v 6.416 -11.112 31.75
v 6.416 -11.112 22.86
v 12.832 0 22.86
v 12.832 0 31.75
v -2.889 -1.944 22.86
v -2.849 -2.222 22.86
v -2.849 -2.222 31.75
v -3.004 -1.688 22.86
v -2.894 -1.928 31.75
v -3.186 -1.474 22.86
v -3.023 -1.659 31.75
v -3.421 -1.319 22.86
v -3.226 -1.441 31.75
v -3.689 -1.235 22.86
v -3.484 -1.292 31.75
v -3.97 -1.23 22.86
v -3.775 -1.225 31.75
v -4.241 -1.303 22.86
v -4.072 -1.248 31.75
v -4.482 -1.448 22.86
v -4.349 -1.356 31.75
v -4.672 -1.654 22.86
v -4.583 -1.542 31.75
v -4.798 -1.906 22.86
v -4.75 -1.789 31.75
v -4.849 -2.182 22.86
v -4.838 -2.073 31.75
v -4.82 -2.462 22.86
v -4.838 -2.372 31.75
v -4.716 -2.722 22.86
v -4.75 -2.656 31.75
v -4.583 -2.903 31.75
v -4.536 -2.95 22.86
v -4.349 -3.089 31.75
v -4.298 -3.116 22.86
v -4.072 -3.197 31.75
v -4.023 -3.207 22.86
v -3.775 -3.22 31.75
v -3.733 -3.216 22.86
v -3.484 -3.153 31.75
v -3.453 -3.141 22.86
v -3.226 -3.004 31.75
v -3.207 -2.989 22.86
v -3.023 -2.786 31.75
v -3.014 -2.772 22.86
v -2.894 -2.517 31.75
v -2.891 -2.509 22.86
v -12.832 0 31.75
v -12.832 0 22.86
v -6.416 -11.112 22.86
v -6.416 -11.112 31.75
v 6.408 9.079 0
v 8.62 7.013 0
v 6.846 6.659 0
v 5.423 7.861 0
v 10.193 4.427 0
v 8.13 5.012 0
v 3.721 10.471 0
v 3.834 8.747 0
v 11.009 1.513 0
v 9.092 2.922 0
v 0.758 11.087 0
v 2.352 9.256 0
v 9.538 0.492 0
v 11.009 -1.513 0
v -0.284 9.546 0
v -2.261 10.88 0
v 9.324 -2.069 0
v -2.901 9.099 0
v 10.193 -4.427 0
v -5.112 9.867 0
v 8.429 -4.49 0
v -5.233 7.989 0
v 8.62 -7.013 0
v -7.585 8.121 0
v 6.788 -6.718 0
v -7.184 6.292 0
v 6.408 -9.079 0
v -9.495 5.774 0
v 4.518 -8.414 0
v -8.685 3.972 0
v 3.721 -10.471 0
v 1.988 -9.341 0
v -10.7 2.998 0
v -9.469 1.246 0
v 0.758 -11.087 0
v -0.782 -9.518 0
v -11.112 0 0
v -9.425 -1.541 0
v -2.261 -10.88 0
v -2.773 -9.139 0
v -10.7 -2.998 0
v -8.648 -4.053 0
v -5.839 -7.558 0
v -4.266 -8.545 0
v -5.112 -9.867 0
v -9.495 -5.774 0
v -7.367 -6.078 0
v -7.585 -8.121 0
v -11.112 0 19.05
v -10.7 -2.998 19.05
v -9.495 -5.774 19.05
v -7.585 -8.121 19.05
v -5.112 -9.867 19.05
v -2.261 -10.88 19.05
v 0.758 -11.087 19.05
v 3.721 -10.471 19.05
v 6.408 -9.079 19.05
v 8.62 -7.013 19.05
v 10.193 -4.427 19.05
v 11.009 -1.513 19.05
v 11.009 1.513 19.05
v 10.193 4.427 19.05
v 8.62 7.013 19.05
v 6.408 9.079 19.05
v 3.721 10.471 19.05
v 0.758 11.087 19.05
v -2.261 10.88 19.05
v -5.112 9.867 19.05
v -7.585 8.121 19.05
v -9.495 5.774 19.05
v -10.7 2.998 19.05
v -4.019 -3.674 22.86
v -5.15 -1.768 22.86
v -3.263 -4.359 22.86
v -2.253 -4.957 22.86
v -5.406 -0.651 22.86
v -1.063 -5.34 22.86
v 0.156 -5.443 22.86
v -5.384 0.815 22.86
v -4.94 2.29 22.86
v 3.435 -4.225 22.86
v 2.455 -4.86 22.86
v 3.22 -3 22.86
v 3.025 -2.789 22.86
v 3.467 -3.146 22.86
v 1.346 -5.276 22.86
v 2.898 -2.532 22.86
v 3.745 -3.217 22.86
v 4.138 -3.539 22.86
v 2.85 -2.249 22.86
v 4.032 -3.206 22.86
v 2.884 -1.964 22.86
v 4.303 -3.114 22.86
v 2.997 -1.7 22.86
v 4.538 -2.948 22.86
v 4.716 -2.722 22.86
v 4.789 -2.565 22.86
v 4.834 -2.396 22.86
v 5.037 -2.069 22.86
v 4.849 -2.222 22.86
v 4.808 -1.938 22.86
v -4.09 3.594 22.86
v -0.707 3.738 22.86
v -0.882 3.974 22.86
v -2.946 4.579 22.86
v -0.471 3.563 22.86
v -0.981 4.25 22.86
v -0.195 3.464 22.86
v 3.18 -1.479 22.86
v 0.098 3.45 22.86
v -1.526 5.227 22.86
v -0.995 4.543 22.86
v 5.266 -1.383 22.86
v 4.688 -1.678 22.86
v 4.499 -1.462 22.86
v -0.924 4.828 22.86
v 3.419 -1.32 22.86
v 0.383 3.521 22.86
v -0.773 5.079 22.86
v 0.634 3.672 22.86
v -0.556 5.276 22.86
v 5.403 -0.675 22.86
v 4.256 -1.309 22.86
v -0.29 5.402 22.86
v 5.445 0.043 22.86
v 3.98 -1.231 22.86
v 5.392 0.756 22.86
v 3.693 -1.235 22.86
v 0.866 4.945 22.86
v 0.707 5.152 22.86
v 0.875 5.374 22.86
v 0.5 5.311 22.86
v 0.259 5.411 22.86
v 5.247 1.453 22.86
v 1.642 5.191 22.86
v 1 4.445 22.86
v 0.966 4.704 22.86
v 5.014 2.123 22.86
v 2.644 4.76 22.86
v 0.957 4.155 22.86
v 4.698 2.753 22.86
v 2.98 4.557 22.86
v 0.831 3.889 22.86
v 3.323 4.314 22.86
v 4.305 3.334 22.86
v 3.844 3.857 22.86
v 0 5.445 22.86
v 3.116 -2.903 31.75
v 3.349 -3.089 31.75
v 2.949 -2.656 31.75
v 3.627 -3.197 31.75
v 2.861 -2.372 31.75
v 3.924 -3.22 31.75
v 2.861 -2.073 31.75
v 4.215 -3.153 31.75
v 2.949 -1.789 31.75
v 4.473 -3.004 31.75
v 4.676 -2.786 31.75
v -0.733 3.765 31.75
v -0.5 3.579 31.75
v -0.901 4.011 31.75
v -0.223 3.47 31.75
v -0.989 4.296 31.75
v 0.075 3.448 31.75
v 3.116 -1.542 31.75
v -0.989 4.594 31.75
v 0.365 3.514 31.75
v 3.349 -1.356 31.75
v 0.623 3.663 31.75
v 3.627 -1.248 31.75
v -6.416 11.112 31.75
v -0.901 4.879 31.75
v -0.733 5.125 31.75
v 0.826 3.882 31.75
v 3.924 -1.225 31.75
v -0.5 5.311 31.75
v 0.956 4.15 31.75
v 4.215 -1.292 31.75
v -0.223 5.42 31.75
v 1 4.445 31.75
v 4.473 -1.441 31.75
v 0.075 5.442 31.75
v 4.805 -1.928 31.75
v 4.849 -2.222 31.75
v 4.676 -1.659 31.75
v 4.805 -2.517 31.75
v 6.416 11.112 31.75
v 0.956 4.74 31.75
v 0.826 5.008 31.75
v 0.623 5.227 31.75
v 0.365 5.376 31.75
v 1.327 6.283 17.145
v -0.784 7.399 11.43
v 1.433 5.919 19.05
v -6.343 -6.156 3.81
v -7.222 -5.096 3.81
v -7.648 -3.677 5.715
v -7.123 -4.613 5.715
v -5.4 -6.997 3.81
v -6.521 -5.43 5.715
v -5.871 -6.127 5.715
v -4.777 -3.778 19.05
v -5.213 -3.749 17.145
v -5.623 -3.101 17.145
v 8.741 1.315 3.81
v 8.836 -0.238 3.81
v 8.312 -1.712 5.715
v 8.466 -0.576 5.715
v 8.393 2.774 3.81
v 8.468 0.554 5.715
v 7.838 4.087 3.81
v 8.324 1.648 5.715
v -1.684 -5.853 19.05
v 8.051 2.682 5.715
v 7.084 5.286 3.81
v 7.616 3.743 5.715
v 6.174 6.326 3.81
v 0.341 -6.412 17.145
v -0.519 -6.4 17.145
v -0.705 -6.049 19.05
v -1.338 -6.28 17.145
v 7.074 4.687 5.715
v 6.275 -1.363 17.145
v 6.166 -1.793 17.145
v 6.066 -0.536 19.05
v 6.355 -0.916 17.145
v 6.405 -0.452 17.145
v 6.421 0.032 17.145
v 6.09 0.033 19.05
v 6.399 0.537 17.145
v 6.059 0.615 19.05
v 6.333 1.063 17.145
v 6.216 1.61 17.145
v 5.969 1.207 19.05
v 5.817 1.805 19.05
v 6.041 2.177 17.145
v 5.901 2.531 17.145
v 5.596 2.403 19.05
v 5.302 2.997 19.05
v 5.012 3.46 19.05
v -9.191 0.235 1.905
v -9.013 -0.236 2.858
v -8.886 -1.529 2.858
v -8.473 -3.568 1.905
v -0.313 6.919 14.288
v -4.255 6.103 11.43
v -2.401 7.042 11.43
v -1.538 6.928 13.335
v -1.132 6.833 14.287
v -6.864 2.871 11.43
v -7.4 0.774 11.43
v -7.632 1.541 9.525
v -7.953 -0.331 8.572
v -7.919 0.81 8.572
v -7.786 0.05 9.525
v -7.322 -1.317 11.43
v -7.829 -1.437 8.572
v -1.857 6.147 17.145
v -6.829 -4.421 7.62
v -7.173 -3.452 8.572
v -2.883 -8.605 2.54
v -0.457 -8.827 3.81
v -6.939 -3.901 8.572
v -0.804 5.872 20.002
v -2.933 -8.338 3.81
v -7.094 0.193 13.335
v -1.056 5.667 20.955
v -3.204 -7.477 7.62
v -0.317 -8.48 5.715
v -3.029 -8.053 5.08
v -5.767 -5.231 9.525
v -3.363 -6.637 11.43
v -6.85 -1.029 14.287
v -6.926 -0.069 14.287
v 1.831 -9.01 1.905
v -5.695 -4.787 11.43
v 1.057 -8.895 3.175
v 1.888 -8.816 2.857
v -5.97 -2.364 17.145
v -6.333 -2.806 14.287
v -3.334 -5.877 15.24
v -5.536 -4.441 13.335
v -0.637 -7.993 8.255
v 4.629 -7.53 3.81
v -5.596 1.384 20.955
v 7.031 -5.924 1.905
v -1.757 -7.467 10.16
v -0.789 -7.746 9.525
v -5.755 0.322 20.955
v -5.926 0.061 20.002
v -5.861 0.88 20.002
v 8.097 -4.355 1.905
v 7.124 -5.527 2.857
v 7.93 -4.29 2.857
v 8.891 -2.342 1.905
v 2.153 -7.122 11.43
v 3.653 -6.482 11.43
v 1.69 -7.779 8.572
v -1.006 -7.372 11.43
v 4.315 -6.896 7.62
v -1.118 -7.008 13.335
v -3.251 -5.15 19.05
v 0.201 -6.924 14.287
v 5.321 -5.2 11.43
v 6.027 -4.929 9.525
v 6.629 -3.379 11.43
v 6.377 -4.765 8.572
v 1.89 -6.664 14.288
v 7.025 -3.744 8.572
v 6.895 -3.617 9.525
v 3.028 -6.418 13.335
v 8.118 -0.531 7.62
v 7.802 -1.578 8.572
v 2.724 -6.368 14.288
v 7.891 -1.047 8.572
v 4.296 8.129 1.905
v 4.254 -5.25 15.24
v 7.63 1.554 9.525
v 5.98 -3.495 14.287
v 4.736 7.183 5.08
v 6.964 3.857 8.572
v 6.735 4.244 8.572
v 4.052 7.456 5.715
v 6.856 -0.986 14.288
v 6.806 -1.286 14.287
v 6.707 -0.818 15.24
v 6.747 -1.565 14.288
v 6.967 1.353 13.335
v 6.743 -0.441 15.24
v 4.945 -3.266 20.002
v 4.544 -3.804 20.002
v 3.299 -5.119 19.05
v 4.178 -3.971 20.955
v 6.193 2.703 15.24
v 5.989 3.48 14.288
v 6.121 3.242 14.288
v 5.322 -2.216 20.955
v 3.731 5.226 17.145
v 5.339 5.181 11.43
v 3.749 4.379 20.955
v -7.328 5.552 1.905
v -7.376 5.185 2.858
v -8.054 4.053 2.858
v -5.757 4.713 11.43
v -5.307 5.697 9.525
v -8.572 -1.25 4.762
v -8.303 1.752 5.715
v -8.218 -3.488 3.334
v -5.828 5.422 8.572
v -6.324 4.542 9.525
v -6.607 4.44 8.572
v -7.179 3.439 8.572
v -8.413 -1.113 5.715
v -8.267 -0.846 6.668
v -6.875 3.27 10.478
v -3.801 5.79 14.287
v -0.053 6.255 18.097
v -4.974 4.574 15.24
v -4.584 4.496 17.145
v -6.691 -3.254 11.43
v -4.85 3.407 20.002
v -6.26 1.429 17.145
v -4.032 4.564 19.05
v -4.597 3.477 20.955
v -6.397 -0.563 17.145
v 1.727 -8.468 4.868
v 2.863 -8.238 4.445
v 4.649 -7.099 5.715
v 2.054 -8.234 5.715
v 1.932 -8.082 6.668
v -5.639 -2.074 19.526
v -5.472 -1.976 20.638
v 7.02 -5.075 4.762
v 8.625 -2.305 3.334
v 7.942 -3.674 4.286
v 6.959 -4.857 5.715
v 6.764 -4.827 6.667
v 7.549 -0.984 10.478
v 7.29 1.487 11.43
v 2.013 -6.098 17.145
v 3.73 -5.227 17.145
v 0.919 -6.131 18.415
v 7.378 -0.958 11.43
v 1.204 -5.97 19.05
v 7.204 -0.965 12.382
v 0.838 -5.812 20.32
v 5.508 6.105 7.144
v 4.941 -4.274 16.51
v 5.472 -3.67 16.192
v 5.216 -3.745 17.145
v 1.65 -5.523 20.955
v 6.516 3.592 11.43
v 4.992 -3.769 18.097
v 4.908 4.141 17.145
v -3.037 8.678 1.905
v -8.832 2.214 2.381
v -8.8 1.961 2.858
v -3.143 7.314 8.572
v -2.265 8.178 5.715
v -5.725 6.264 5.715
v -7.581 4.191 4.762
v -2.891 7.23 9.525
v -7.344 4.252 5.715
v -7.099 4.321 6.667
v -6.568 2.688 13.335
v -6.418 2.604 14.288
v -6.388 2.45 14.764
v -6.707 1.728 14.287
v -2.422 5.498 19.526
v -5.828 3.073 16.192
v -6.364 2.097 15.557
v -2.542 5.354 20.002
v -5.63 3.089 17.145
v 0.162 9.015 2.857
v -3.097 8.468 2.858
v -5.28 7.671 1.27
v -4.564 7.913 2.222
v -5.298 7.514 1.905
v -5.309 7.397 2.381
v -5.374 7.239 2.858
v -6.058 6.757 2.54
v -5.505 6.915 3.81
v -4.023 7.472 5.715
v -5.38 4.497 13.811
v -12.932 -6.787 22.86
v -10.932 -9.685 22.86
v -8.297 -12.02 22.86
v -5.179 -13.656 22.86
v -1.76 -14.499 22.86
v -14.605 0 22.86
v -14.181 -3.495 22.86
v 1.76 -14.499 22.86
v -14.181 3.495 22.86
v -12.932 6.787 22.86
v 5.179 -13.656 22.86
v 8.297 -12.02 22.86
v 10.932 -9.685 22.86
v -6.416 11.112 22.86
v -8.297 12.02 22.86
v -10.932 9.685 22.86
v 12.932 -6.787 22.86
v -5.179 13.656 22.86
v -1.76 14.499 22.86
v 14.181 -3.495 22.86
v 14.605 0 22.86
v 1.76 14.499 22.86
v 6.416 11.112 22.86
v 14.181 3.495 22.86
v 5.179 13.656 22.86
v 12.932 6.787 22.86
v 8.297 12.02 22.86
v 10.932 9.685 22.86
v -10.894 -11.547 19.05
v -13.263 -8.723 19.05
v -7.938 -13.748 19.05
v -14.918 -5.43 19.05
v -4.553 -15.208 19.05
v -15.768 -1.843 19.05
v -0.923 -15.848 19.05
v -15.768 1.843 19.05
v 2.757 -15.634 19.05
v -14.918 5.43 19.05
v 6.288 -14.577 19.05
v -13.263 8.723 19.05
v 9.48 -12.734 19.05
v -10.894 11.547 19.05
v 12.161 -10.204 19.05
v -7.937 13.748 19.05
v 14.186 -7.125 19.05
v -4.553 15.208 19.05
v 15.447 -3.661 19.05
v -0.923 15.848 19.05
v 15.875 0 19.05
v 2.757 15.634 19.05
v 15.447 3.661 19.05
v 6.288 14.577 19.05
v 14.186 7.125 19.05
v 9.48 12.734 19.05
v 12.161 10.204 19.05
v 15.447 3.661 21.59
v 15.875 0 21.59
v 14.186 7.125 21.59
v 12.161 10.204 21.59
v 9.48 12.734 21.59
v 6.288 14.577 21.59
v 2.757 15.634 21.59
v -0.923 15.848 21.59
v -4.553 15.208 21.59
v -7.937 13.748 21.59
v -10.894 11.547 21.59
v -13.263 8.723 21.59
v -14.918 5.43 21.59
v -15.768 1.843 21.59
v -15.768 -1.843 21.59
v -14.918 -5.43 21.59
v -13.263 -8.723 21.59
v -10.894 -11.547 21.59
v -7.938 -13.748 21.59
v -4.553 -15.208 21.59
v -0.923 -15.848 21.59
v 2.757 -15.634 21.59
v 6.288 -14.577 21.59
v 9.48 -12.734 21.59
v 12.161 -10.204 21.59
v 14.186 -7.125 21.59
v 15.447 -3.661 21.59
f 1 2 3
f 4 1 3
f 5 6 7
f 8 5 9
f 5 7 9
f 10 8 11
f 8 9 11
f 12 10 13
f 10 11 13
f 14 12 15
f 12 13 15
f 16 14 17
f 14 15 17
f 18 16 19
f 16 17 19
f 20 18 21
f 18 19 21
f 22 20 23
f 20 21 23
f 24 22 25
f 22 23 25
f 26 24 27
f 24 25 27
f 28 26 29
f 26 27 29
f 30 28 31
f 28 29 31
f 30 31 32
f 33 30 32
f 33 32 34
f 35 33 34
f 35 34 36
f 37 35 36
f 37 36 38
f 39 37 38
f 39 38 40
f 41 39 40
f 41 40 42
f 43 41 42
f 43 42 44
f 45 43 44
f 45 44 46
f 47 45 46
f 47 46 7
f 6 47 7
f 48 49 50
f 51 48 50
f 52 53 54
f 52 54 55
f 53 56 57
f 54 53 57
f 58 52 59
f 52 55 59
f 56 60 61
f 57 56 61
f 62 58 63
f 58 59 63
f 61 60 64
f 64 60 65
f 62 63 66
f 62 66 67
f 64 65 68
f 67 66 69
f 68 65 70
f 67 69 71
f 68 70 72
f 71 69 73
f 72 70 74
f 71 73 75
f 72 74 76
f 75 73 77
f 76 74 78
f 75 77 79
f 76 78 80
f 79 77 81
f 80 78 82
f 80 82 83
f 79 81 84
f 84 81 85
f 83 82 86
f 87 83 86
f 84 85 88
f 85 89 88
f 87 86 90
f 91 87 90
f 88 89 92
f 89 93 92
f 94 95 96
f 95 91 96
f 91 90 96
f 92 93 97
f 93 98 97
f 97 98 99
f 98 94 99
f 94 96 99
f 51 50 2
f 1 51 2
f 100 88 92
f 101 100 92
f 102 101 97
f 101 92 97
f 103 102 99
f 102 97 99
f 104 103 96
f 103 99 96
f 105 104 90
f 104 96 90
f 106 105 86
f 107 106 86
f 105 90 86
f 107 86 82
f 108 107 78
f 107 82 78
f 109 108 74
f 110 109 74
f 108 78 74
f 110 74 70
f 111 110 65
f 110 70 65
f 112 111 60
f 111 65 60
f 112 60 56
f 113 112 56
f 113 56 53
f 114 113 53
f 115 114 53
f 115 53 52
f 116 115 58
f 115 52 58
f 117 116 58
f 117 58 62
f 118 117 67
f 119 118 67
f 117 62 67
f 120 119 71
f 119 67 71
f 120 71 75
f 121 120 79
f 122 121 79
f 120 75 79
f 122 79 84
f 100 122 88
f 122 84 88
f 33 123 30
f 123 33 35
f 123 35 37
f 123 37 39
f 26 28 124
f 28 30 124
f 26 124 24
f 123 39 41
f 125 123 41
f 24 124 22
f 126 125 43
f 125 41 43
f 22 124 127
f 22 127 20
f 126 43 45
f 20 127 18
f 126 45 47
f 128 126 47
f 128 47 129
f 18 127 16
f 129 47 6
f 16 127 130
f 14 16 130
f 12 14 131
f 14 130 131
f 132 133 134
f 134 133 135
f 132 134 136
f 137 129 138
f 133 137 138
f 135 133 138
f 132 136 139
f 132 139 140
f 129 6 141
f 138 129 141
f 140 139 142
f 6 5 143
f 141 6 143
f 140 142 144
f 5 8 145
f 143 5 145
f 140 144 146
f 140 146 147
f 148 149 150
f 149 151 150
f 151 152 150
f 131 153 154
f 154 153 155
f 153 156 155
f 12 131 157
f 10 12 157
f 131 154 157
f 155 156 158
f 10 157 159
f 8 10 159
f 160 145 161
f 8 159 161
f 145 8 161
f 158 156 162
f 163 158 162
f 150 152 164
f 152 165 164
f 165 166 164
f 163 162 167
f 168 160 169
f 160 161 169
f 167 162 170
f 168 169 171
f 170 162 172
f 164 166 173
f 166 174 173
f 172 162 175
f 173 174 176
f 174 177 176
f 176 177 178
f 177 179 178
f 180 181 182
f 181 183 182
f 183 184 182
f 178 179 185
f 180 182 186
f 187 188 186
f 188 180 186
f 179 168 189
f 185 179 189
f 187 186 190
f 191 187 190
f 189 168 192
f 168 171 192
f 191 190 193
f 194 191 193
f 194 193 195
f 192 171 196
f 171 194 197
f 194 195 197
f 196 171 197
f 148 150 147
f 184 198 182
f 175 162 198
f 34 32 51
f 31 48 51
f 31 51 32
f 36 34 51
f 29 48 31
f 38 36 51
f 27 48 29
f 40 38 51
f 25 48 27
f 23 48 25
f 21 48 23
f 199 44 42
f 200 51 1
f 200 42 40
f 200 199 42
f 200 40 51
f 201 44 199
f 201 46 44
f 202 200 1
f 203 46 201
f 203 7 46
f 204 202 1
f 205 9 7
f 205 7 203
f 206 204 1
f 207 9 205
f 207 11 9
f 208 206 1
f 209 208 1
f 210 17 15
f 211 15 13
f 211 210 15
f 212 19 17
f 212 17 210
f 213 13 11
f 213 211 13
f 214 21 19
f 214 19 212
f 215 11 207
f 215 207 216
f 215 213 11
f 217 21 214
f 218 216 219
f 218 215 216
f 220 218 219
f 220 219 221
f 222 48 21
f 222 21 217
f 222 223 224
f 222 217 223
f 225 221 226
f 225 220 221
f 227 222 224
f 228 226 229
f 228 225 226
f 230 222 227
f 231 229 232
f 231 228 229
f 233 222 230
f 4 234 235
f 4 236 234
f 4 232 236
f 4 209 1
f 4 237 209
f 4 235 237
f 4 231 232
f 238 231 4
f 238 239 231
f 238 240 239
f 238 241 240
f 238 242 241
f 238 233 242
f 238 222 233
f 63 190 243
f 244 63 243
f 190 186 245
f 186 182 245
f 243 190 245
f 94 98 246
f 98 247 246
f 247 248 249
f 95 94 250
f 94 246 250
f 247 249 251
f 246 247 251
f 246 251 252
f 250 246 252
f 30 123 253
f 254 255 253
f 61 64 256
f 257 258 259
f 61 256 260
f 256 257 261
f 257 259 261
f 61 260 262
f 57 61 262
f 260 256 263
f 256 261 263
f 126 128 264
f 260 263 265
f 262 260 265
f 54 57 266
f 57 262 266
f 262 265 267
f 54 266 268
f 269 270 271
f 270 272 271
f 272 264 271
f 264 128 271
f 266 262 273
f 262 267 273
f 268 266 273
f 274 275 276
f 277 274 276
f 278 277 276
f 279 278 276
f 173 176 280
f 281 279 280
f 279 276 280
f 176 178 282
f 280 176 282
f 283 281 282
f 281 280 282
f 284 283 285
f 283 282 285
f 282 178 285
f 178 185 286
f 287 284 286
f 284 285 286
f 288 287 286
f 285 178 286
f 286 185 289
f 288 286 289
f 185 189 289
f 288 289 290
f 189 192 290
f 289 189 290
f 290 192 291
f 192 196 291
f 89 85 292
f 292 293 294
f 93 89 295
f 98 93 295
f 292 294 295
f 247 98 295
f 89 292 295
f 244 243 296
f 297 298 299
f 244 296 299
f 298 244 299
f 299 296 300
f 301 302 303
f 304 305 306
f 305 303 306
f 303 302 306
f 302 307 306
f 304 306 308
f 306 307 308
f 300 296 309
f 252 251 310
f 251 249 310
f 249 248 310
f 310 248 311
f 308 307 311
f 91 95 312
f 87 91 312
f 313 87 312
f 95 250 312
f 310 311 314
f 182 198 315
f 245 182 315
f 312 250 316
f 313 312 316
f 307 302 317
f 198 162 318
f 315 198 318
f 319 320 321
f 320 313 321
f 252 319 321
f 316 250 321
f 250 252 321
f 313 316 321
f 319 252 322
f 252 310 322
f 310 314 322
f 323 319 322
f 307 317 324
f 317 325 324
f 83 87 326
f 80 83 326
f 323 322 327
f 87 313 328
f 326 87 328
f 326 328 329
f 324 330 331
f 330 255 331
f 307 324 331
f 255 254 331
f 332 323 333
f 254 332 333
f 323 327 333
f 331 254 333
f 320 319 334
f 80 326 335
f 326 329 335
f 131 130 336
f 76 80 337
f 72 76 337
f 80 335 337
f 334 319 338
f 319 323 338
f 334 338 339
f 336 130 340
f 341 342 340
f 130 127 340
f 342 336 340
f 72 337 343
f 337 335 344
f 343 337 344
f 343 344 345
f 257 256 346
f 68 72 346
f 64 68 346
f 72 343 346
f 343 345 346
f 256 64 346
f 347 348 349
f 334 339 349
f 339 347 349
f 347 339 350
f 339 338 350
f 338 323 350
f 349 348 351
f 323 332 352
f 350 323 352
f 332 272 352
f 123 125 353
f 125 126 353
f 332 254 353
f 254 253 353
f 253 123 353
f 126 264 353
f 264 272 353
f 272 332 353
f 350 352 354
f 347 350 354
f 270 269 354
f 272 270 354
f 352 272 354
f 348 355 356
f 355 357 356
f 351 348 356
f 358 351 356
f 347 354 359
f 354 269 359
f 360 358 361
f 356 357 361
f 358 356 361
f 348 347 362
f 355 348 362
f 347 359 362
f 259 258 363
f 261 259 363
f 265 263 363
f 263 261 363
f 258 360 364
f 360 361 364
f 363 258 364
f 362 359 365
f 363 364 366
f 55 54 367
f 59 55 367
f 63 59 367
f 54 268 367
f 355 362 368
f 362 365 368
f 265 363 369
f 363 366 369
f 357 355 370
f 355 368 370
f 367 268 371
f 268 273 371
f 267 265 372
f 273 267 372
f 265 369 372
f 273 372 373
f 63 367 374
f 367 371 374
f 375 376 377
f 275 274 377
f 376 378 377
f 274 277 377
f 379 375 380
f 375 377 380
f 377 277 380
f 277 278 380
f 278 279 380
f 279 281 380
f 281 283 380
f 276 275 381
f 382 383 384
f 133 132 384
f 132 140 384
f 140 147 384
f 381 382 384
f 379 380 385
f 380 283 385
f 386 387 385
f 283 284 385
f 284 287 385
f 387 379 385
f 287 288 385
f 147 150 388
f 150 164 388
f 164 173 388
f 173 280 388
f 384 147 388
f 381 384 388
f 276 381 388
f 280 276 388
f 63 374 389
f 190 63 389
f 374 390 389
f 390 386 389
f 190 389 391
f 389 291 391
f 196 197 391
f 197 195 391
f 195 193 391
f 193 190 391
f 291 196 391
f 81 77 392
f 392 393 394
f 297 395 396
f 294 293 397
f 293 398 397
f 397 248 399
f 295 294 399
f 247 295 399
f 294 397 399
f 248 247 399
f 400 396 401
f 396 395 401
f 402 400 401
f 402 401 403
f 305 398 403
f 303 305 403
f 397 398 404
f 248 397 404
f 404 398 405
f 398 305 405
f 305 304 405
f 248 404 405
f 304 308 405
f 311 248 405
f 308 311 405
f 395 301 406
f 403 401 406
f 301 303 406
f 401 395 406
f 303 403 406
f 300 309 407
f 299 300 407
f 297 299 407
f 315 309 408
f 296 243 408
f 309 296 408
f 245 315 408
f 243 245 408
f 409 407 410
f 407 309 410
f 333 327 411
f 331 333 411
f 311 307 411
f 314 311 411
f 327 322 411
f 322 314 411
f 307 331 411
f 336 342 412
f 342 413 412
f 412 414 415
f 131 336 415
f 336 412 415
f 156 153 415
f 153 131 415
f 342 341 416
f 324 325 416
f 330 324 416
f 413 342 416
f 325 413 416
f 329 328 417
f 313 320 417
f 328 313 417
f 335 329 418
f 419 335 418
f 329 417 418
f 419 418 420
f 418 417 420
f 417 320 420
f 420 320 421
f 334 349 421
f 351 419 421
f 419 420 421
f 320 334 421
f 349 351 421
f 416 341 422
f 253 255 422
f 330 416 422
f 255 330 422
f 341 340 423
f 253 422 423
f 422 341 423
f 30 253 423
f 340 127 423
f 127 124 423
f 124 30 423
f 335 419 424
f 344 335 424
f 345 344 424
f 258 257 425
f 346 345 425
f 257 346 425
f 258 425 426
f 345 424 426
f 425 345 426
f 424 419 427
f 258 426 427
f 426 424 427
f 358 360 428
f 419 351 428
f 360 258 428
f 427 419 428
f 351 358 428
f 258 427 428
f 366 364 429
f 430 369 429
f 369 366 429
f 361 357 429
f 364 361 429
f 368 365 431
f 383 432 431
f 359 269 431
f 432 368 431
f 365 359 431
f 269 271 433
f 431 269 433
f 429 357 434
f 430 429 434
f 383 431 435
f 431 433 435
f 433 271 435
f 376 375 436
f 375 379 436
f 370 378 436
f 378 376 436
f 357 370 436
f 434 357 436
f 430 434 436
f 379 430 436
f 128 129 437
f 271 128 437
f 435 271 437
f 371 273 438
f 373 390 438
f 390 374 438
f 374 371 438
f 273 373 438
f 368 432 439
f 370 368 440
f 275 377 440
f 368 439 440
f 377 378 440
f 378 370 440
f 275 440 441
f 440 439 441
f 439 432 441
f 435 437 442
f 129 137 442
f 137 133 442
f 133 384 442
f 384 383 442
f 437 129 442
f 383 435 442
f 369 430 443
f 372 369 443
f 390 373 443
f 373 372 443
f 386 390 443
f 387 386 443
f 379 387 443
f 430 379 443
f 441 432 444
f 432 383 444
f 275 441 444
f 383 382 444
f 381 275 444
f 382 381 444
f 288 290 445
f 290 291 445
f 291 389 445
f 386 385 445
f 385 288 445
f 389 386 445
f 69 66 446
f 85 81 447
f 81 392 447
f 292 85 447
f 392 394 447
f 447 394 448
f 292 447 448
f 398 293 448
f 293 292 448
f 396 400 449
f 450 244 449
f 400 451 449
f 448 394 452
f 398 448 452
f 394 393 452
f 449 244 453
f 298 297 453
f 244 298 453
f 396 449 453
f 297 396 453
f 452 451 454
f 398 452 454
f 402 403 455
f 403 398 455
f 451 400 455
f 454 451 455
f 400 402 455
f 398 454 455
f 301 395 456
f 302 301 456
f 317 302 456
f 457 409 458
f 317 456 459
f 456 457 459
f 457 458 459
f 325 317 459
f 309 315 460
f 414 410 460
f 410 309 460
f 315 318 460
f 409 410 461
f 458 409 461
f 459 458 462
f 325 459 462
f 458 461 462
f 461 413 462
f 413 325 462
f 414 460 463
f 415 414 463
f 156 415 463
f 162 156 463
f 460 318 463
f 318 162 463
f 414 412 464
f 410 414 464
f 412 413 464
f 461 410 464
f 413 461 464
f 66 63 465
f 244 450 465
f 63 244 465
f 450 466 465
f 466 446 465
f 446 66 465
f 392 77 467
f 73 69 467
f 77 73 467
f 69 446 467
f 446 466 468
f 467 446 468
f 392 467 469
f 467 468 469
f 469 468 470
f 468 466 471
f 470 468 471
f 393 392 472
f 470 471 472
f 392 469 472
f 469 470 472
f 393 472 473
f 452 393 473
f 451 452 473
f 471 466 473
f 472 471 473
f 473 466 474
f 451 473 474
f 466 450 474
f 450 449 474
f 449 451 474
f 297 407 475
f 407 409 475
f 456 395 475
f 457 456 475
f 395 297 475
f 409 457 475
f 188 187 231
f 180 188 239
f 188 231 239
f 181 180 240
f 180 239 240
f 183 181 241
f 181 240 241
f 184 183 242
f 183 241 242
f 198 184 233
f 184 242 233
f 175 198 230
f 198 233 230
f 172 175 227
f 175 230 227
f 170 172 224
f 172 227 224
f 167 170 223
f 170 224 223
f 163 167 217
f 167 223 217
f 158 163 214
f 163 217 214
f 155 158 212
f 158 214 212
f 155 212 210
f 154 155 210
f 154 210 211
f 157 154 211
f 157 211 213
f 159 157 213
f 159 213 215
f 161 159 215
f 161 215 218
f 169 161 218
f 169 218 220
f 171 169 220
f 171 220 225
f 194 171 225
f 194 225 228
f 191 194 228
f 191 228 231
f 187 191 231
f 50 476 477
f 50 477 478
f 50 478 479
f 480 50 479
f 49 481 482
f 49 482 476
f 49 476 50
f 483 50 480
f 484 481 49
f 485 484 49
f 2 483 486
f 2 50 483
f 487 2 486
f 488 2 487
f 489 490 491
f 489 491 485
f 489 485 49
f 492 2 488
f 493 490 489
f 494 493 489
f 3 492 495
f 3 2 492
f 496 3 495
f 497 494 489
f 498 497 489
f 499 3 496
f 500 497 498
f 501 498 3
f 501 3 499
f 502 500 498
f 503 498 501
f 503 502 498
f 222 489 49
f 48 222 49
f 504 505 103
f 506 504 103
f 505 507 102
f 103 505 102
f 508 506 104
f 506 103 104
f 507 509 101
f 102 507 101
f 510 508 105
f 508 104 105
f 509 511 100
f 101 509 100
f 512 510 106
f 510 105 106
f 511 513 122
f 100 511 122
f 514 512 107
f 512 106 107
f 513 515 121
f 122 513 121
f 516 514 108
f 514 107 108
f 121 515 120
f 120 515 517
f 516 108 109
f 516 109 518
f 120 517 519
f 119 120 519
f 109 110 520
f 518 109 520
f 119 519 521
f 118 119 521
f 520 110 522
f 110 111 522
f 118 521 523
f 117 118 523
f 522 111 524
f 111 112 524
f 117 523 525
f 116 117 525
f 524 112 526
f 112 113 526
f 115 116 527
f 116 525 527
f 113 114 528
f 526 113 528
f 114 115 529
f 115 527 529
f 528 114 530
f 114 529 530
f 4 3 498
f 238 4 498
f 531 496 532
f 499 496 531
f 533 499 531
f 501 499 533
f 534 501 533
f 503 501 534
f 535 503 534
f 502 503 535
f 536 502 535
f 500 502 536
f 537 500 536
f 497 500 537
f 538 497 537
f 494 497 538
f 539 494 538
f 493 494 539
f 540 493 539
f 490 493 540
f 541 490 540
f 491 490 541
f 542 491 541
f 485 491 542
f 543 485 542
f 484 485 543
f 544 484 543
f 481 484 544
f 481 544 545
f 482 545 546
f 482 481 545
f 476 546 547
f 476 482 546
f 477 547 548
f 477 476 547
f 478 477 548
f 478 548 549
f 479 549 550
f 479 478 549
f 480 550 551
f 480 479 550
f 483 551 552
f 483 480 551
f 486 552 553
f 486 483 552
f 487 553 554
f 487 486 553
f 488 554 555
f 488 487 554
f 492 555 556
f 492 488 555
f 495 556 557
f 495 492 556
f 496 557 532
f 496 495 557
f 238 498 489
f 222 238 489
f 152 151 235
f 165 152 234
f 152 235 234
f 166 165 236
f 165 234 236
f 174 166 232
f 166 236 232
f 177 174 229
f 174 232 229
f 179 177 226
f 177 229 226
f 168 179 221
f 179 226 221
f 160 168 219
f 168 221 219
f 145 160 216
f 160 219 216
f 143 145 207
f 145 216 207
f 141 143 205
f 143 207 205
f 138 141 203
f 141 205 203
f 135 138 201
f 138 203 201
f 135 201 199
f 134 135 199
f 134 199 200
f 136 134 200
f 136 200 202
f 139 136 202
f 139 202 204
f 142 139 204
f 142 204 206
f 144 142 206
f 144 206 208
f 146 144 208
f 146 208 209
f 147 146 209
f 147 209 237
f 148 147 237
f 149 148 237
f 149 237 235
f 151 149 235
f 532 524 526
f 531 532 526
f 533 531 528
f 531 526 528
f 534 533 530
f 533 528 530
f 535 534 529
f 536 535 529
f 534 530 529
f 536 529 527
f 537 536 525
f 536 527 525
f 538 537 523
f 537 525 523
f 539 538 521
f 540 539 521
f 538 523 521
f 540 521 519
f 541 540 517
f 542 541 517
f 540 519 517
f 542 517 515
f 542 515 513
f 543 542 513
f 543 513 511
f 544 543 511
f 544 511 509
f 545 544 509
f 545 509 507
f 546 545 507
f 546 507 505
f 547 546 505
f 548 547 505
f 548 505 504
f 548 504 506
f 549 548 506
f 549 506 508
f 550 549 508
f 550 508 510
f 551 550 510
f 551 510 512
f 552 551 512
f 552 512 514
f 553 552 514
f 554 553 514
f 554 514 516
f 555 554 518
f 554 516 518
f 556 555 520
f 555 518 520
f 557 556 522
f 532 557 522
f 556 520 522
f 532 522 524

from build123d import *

# Parameters (mm, degrees)
SKETCH1_R           = 11.1125
BOSS_EXTRUDE1_DEPTH = 19.05
SKETCH2_R           = 15.875
BOSS_EXTRUDE2_DEPTH = 12.7
CUT_EXTRUDE1_START  = -8.89
SKETCH3_R           = 15.875
CUT_EXTRUDE1_DEPTH  = 8.89
CHAMFER1_SIZE       = 1.27
CUT_EXTRUDE2_REACH  = 40.886
SKETCH4_R           = 1


with BuildPart() as part:
    # Sketch1 → Boss-Extrude1 (new body)
    with BuildSketch(Plane.XY):
        with Locations(Location((0, 0, 0), (0, 0, 180))):
            Circle(SKETCH1_R)
    extrude(amount=BOSS_EXTRUDE1_DEPTH)

    # Sketch2 → Boss-Extrude2 (add)
    with BuildSketch(Plane.XY.offset(19.05)):
        Circle(SKETCH2_R)
    extrude(amount=BOSS_EXTRUDE2_DEPTH)

    # Sketch3 → Cut-Extrude1 (cut)
    with BuildSketch(Plane.XY.offset(31.75).offset(CUT_EXTRUDE1_START)):
        Circle(SKETCH3_R)
        Polygon((12.831609733, 0), (6.415804866, 11.1125), (-6.415804866, 11.1125), (-12.831609733, 0), (-6.415804866, -11.1125), (6.415804866, -11.1125), align=None, mode=Mode.SUBTRACT)
    extrude(amount=CUT_EXTRUDE1_DEPTH, mode=Mode.SUBTRACT)

    # Chamfer1
    chamfer1_edges = [part.edges().sort_by_distance(p)[0] for p in [
        (-15.875, 0, 22.86),
    ]]
    chamfer(chamfer1_edges, length=CHAMFER1_SIZE)

    # Cut-Loft1: read off the stored shape, not the designer's step
    # Cut-Loft1: loft between two sections, ruled curve by curve
    cut_loft1_from = [
        Edge.make_bspline([(2.35183174, 9.256296648, 0), (-16.160761555, 13.959960127, 0), (-20.864425035, -4.552633168, 0), (-2.35183174, -9.256296648, 0), (16.160761555, -13.959960127, 0), (20.864425035, 4.552633168, 0), (2.35183174, 9.256296648, 0)], [0, 0, 0, 0, 0.5, 0.5, 0.5, 1, 1, 1, 1], 3, [1, 0.333333333, 0.333333333, 1, 0.333333333, 0.333333333, 1]),
    ]
    cut_loft1_to = [
        Edge.make_bspline([(2.644109425, 4.759906548, 22.86), (-6.875703672, 10.048125398, 22.86), (-12.163922522, 0.528312301, 22.86), (-2.644109425, -4.759906548, 22.86), (6.875703672, -10.048125398, 22.86), (12.163922522, -0.528312301, 22.86), (2.644109425, 4.759906548, 22.86)], [0, 0, 0, 0, 0.5, 0.5, 0.5, 1, 1, 1, 1], 3, [1, 0.333333333, 0.333333333, 1, 0.333333333, 0.333333333, 1]),
    ]
    cut_loft1 = Solid(Shell([*[Face.make_surface_from_curves(cut_loft1_from[k], cut_loft1_to[k]) for k in range(1)], Face(Wire(cut_loft1_from)), Face(Wire(cut_loft1_to))]))
    add(cut_loft1, mode=Mode.SUBTRACT)

    # Sketch4 → Cut-Extrude2 (cut, up to next)
    with BuildSketch(Plane.XY.offset(31.75), mode=Mode.PRIVATE) as cut_extrude2_sk1:
        with Locations((0, 4.445)):
            Circle(SKETCH4_R)
    cut_extrude2_tool1 = extrude(cut_extrude2_sk1.sketch, amount=-CUT_EXTRUDE2_REACH, mode=Mode.PRIVATE) & part.part
    # Sketch4 → Cut-Extrude2 (cut, up to next)
    with BuildSketch(Plane.XY.offset(31.75), mode=Mode.PRIVATE) as cut_extrude2_sk2:
        with Locations((3.84948292, -2.2225)):
            Circle(SKETCH4_R)
    cut_extrude2_tool2 = extrude(cut_extrude2_sk2.sketch, amount=-CUT_EXTRUDE2_REACH, mode=Mode.PRIVATE) & part.part
    # Sketch4 → Cut-Extrude2 (cut, up to next)
    with BuildSketch(Plane.XY.offset(31.75), mode=Mode.PRIVATE) as cut_extrude2_sk3:
        with Locations((-3.84948292, -2.2225)):
            Circle(SKETCH4_R)
    cut_extrude2_tool3 = extrude(cut_extrude2_sk3.sketch, amount=-CUT_EXTRUDE2_REACH, mode=Mode.PRIVATE) & part.part
    add(cut_extrude2_tool1.solids().sort_by_distance((0, 4.445, 31.75))[0], mode=Mode.SUBTRACT)
    add(cut_extrude2_tool2.solids().sort_by_distance((3.849483, -2.2225, 31.75))[0], mode=Mode.SUBTRACT)
    add(cut_extrude2_tool3.solids().sort_by_distance((-3.849483, -2.2225, 31.75))[0], mode=Mode.SUBTRACT)


solid = part.part
